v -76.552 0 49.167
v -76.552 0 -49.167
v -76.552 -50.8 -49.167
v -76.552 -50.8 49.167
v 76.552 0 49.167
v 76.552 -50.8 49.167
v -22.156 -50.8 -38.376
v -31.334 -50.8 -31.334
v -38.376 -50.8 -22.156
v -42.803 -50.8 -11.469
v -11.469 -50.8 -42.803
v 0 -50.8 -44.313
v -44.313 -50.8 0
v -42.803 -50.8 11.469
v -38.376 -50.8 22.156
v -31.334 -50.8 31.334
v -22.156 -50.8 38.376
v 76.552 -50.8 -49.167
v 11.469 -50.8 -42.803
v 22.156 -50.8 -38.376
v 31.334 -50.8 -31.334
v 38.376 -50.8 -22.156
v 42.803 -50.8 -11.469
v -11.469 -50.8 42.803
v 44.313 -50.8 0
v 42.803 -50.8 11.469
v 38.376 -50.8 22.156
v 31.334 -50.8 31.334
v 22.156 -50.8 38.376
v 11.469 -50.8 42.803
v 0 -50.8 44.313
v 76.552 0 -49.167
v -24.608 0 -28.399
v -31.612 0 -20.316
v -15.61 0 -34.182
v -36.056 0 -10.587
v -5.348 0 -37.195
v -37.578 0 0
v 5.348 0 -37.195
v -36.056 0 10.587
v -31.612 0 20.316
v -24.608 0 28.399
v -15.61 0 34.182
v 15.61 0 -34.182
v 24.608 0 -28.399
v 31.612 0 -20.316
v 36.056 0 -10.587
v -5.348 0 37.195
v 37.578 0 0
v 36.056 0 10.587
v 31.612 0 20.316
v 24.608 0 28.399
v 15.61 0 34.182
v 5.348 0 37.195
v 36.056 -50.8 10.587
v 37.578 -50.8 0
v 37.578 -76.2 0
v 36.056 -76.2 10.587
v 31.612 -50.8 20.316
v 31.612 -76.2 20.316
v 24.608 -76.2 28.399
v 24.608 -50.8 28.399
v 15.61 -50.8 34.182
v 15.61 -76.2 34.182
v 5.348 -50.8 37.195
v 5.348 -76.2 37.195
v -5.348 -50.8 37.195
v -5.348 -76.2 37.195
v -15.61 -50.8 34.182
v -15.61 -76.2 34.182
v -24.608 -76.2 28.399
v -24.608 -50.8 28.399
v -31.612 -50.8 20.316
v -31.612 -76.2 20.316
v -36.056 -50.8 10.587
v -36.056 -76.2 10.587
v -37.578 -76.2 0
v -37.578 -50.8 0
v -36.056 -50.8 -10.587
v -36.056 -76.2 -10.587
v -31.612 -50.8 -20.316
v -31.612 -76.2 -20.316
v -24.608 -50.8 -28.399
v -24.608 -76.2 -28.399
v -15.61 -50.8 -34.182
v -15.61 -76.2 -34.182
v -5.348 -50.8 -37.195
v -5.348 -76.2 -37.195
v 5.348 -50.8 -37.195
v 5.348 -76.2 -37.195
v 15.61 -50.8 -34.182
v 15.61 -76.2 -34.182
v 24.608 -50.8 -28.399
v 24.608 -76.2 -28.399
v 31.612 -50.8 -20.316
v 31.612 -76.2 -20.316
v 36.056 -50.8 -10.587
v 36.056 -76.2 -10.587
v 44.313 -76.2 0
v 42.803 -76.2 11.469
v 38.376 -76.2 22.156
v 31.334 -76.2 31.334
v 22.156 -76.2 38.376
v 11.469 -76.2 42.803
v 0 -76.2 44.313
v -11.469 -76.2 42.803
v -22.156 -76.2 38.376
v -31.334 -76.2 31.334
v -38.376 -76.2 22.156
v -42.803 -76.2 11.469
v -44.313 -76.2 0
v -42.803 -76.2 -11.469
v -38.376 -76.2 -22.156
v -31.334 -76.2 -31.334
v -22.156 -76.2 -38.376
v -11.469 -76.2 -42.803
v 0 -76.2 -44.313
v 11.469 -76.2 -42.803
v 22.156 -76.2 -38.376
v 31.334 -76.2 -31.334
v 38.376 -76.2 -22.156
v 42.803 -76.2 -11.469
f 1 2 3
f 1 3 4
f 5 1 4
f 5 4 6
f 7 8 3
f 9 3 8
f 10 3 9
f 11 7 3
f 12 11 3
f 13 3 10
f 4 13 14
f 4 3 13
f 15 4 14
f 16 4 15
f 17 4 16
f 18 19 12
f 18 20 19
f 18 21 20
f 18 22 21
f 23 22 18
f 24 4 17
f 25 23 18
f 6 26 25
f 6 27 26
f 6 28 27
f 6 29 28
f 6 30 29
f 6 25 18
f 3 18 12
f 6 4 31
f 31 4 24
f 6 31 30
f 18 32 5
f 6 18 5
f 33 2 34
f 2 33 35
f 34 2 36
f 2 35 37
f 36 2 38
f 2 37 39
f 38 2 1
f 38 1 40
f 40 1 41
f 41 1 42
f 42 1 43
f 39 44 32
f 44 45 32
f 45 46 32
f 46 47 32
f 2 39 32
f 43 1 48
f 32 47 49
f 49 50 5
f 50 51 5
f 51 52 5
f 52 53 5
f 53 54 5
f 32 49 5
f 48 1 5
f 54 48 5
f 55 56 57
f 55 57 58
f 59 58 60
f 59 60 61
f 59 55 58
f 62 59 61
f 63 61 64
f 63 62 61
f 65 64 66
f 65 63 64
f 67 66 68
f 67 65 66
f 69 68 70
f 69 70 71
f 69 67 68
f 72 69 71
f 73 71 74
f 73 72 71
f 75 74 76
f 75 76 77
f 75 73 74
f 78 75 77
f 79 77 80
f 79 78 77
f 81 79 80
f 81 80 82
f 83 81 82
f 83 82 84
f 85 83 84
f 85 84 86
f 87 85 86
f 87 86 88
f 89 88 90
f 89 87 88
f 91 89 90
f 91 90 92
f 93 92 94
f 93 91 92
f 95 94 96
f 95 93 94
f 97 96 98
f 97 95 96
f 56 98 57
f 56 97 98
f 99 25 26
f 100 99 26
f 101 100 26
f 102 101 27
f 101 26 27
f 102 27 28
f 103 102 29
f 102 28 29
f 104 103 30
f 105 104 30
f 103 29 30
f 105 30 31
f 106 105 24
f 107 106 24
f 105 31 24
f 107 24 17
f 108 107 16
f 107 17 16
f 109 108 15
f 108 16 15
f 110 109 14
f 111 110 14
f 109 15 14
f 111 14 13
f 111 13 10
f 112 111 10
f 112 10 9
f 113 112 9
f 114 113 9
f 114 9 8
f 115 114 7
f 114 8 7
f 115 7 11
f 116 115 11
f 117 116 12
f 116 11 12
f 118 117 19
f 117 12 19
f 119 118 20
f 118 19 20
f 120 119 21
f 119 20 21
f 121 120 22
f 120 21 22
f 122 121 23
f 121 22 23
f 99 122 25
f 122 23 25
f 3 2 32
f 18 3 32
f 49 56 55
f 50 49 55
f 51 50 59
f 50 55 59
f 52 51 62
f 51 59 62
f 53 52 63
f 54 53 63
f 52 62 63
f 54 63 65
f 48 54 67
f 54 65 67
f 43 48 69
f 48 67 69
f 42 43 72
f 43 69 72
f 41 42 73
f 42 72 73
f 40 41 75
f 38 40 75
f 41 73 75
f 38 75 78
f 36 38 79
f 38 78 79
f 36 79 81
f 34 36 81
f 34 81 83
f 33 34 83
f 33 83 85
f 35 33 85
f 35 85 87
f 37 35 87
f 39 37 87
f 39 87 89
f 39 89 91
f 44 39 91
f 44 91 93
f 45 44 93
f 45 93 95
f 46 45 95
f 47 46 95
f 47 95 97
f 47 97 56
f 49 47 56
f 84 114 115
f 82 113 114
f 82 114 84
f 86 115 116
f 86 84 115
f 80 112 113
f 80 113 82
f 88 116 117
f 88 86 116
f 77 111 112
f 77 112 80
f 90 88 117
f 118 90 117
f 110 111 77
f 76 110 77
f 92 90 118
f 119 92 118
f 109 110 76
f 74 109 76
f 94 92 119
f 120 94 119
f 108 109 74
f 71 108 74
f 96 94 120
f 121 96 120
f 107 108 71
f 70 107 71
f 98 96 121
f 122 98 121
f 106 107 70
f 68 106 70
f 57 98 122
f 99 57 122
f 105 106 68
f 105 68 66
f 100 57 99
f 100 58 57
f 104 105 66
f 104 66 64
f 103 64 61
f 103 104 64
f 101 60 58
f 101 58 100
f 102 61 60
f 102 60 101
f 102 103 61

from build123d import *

# Parameters (mm, degrees)
F0_W      = 153.103292
F0_H      = 98.334714
F1_DEPTH  = 50.8
F2_R      = 44.312838
F2_R_2    = 37.577791
F3_DEPTH  = 25.4
F3_FACE_R = 37.577791
F4_DEPTH  = 76.2


with BuildPart() as f1:
    # F0 (on Front) → F1 (new body)
    with BuildSketch(Plane.XZ):
        Rectangle(F0_W, F0_H)
    extrude(amount=F1_DEPTH)

    # F2 (on face) → F3 (join)
    with BuildSketch(Plane.XZ.offset(50.8)):
        Circle(F2_R)
        Circle(F2_R_2, mode=Mode.SUBTRACT)
    extrude(amount=F3_DEPTH)

    # F3_face (on face) → F4 (cut)
    with BuildSketch(Plane.XZ.offset(50.8)):
        Circle(F3_FACE_R)
    extrude(amount=-F4_DEPTH, mode=Mode.SUBTRACT)


solid = f1.part
